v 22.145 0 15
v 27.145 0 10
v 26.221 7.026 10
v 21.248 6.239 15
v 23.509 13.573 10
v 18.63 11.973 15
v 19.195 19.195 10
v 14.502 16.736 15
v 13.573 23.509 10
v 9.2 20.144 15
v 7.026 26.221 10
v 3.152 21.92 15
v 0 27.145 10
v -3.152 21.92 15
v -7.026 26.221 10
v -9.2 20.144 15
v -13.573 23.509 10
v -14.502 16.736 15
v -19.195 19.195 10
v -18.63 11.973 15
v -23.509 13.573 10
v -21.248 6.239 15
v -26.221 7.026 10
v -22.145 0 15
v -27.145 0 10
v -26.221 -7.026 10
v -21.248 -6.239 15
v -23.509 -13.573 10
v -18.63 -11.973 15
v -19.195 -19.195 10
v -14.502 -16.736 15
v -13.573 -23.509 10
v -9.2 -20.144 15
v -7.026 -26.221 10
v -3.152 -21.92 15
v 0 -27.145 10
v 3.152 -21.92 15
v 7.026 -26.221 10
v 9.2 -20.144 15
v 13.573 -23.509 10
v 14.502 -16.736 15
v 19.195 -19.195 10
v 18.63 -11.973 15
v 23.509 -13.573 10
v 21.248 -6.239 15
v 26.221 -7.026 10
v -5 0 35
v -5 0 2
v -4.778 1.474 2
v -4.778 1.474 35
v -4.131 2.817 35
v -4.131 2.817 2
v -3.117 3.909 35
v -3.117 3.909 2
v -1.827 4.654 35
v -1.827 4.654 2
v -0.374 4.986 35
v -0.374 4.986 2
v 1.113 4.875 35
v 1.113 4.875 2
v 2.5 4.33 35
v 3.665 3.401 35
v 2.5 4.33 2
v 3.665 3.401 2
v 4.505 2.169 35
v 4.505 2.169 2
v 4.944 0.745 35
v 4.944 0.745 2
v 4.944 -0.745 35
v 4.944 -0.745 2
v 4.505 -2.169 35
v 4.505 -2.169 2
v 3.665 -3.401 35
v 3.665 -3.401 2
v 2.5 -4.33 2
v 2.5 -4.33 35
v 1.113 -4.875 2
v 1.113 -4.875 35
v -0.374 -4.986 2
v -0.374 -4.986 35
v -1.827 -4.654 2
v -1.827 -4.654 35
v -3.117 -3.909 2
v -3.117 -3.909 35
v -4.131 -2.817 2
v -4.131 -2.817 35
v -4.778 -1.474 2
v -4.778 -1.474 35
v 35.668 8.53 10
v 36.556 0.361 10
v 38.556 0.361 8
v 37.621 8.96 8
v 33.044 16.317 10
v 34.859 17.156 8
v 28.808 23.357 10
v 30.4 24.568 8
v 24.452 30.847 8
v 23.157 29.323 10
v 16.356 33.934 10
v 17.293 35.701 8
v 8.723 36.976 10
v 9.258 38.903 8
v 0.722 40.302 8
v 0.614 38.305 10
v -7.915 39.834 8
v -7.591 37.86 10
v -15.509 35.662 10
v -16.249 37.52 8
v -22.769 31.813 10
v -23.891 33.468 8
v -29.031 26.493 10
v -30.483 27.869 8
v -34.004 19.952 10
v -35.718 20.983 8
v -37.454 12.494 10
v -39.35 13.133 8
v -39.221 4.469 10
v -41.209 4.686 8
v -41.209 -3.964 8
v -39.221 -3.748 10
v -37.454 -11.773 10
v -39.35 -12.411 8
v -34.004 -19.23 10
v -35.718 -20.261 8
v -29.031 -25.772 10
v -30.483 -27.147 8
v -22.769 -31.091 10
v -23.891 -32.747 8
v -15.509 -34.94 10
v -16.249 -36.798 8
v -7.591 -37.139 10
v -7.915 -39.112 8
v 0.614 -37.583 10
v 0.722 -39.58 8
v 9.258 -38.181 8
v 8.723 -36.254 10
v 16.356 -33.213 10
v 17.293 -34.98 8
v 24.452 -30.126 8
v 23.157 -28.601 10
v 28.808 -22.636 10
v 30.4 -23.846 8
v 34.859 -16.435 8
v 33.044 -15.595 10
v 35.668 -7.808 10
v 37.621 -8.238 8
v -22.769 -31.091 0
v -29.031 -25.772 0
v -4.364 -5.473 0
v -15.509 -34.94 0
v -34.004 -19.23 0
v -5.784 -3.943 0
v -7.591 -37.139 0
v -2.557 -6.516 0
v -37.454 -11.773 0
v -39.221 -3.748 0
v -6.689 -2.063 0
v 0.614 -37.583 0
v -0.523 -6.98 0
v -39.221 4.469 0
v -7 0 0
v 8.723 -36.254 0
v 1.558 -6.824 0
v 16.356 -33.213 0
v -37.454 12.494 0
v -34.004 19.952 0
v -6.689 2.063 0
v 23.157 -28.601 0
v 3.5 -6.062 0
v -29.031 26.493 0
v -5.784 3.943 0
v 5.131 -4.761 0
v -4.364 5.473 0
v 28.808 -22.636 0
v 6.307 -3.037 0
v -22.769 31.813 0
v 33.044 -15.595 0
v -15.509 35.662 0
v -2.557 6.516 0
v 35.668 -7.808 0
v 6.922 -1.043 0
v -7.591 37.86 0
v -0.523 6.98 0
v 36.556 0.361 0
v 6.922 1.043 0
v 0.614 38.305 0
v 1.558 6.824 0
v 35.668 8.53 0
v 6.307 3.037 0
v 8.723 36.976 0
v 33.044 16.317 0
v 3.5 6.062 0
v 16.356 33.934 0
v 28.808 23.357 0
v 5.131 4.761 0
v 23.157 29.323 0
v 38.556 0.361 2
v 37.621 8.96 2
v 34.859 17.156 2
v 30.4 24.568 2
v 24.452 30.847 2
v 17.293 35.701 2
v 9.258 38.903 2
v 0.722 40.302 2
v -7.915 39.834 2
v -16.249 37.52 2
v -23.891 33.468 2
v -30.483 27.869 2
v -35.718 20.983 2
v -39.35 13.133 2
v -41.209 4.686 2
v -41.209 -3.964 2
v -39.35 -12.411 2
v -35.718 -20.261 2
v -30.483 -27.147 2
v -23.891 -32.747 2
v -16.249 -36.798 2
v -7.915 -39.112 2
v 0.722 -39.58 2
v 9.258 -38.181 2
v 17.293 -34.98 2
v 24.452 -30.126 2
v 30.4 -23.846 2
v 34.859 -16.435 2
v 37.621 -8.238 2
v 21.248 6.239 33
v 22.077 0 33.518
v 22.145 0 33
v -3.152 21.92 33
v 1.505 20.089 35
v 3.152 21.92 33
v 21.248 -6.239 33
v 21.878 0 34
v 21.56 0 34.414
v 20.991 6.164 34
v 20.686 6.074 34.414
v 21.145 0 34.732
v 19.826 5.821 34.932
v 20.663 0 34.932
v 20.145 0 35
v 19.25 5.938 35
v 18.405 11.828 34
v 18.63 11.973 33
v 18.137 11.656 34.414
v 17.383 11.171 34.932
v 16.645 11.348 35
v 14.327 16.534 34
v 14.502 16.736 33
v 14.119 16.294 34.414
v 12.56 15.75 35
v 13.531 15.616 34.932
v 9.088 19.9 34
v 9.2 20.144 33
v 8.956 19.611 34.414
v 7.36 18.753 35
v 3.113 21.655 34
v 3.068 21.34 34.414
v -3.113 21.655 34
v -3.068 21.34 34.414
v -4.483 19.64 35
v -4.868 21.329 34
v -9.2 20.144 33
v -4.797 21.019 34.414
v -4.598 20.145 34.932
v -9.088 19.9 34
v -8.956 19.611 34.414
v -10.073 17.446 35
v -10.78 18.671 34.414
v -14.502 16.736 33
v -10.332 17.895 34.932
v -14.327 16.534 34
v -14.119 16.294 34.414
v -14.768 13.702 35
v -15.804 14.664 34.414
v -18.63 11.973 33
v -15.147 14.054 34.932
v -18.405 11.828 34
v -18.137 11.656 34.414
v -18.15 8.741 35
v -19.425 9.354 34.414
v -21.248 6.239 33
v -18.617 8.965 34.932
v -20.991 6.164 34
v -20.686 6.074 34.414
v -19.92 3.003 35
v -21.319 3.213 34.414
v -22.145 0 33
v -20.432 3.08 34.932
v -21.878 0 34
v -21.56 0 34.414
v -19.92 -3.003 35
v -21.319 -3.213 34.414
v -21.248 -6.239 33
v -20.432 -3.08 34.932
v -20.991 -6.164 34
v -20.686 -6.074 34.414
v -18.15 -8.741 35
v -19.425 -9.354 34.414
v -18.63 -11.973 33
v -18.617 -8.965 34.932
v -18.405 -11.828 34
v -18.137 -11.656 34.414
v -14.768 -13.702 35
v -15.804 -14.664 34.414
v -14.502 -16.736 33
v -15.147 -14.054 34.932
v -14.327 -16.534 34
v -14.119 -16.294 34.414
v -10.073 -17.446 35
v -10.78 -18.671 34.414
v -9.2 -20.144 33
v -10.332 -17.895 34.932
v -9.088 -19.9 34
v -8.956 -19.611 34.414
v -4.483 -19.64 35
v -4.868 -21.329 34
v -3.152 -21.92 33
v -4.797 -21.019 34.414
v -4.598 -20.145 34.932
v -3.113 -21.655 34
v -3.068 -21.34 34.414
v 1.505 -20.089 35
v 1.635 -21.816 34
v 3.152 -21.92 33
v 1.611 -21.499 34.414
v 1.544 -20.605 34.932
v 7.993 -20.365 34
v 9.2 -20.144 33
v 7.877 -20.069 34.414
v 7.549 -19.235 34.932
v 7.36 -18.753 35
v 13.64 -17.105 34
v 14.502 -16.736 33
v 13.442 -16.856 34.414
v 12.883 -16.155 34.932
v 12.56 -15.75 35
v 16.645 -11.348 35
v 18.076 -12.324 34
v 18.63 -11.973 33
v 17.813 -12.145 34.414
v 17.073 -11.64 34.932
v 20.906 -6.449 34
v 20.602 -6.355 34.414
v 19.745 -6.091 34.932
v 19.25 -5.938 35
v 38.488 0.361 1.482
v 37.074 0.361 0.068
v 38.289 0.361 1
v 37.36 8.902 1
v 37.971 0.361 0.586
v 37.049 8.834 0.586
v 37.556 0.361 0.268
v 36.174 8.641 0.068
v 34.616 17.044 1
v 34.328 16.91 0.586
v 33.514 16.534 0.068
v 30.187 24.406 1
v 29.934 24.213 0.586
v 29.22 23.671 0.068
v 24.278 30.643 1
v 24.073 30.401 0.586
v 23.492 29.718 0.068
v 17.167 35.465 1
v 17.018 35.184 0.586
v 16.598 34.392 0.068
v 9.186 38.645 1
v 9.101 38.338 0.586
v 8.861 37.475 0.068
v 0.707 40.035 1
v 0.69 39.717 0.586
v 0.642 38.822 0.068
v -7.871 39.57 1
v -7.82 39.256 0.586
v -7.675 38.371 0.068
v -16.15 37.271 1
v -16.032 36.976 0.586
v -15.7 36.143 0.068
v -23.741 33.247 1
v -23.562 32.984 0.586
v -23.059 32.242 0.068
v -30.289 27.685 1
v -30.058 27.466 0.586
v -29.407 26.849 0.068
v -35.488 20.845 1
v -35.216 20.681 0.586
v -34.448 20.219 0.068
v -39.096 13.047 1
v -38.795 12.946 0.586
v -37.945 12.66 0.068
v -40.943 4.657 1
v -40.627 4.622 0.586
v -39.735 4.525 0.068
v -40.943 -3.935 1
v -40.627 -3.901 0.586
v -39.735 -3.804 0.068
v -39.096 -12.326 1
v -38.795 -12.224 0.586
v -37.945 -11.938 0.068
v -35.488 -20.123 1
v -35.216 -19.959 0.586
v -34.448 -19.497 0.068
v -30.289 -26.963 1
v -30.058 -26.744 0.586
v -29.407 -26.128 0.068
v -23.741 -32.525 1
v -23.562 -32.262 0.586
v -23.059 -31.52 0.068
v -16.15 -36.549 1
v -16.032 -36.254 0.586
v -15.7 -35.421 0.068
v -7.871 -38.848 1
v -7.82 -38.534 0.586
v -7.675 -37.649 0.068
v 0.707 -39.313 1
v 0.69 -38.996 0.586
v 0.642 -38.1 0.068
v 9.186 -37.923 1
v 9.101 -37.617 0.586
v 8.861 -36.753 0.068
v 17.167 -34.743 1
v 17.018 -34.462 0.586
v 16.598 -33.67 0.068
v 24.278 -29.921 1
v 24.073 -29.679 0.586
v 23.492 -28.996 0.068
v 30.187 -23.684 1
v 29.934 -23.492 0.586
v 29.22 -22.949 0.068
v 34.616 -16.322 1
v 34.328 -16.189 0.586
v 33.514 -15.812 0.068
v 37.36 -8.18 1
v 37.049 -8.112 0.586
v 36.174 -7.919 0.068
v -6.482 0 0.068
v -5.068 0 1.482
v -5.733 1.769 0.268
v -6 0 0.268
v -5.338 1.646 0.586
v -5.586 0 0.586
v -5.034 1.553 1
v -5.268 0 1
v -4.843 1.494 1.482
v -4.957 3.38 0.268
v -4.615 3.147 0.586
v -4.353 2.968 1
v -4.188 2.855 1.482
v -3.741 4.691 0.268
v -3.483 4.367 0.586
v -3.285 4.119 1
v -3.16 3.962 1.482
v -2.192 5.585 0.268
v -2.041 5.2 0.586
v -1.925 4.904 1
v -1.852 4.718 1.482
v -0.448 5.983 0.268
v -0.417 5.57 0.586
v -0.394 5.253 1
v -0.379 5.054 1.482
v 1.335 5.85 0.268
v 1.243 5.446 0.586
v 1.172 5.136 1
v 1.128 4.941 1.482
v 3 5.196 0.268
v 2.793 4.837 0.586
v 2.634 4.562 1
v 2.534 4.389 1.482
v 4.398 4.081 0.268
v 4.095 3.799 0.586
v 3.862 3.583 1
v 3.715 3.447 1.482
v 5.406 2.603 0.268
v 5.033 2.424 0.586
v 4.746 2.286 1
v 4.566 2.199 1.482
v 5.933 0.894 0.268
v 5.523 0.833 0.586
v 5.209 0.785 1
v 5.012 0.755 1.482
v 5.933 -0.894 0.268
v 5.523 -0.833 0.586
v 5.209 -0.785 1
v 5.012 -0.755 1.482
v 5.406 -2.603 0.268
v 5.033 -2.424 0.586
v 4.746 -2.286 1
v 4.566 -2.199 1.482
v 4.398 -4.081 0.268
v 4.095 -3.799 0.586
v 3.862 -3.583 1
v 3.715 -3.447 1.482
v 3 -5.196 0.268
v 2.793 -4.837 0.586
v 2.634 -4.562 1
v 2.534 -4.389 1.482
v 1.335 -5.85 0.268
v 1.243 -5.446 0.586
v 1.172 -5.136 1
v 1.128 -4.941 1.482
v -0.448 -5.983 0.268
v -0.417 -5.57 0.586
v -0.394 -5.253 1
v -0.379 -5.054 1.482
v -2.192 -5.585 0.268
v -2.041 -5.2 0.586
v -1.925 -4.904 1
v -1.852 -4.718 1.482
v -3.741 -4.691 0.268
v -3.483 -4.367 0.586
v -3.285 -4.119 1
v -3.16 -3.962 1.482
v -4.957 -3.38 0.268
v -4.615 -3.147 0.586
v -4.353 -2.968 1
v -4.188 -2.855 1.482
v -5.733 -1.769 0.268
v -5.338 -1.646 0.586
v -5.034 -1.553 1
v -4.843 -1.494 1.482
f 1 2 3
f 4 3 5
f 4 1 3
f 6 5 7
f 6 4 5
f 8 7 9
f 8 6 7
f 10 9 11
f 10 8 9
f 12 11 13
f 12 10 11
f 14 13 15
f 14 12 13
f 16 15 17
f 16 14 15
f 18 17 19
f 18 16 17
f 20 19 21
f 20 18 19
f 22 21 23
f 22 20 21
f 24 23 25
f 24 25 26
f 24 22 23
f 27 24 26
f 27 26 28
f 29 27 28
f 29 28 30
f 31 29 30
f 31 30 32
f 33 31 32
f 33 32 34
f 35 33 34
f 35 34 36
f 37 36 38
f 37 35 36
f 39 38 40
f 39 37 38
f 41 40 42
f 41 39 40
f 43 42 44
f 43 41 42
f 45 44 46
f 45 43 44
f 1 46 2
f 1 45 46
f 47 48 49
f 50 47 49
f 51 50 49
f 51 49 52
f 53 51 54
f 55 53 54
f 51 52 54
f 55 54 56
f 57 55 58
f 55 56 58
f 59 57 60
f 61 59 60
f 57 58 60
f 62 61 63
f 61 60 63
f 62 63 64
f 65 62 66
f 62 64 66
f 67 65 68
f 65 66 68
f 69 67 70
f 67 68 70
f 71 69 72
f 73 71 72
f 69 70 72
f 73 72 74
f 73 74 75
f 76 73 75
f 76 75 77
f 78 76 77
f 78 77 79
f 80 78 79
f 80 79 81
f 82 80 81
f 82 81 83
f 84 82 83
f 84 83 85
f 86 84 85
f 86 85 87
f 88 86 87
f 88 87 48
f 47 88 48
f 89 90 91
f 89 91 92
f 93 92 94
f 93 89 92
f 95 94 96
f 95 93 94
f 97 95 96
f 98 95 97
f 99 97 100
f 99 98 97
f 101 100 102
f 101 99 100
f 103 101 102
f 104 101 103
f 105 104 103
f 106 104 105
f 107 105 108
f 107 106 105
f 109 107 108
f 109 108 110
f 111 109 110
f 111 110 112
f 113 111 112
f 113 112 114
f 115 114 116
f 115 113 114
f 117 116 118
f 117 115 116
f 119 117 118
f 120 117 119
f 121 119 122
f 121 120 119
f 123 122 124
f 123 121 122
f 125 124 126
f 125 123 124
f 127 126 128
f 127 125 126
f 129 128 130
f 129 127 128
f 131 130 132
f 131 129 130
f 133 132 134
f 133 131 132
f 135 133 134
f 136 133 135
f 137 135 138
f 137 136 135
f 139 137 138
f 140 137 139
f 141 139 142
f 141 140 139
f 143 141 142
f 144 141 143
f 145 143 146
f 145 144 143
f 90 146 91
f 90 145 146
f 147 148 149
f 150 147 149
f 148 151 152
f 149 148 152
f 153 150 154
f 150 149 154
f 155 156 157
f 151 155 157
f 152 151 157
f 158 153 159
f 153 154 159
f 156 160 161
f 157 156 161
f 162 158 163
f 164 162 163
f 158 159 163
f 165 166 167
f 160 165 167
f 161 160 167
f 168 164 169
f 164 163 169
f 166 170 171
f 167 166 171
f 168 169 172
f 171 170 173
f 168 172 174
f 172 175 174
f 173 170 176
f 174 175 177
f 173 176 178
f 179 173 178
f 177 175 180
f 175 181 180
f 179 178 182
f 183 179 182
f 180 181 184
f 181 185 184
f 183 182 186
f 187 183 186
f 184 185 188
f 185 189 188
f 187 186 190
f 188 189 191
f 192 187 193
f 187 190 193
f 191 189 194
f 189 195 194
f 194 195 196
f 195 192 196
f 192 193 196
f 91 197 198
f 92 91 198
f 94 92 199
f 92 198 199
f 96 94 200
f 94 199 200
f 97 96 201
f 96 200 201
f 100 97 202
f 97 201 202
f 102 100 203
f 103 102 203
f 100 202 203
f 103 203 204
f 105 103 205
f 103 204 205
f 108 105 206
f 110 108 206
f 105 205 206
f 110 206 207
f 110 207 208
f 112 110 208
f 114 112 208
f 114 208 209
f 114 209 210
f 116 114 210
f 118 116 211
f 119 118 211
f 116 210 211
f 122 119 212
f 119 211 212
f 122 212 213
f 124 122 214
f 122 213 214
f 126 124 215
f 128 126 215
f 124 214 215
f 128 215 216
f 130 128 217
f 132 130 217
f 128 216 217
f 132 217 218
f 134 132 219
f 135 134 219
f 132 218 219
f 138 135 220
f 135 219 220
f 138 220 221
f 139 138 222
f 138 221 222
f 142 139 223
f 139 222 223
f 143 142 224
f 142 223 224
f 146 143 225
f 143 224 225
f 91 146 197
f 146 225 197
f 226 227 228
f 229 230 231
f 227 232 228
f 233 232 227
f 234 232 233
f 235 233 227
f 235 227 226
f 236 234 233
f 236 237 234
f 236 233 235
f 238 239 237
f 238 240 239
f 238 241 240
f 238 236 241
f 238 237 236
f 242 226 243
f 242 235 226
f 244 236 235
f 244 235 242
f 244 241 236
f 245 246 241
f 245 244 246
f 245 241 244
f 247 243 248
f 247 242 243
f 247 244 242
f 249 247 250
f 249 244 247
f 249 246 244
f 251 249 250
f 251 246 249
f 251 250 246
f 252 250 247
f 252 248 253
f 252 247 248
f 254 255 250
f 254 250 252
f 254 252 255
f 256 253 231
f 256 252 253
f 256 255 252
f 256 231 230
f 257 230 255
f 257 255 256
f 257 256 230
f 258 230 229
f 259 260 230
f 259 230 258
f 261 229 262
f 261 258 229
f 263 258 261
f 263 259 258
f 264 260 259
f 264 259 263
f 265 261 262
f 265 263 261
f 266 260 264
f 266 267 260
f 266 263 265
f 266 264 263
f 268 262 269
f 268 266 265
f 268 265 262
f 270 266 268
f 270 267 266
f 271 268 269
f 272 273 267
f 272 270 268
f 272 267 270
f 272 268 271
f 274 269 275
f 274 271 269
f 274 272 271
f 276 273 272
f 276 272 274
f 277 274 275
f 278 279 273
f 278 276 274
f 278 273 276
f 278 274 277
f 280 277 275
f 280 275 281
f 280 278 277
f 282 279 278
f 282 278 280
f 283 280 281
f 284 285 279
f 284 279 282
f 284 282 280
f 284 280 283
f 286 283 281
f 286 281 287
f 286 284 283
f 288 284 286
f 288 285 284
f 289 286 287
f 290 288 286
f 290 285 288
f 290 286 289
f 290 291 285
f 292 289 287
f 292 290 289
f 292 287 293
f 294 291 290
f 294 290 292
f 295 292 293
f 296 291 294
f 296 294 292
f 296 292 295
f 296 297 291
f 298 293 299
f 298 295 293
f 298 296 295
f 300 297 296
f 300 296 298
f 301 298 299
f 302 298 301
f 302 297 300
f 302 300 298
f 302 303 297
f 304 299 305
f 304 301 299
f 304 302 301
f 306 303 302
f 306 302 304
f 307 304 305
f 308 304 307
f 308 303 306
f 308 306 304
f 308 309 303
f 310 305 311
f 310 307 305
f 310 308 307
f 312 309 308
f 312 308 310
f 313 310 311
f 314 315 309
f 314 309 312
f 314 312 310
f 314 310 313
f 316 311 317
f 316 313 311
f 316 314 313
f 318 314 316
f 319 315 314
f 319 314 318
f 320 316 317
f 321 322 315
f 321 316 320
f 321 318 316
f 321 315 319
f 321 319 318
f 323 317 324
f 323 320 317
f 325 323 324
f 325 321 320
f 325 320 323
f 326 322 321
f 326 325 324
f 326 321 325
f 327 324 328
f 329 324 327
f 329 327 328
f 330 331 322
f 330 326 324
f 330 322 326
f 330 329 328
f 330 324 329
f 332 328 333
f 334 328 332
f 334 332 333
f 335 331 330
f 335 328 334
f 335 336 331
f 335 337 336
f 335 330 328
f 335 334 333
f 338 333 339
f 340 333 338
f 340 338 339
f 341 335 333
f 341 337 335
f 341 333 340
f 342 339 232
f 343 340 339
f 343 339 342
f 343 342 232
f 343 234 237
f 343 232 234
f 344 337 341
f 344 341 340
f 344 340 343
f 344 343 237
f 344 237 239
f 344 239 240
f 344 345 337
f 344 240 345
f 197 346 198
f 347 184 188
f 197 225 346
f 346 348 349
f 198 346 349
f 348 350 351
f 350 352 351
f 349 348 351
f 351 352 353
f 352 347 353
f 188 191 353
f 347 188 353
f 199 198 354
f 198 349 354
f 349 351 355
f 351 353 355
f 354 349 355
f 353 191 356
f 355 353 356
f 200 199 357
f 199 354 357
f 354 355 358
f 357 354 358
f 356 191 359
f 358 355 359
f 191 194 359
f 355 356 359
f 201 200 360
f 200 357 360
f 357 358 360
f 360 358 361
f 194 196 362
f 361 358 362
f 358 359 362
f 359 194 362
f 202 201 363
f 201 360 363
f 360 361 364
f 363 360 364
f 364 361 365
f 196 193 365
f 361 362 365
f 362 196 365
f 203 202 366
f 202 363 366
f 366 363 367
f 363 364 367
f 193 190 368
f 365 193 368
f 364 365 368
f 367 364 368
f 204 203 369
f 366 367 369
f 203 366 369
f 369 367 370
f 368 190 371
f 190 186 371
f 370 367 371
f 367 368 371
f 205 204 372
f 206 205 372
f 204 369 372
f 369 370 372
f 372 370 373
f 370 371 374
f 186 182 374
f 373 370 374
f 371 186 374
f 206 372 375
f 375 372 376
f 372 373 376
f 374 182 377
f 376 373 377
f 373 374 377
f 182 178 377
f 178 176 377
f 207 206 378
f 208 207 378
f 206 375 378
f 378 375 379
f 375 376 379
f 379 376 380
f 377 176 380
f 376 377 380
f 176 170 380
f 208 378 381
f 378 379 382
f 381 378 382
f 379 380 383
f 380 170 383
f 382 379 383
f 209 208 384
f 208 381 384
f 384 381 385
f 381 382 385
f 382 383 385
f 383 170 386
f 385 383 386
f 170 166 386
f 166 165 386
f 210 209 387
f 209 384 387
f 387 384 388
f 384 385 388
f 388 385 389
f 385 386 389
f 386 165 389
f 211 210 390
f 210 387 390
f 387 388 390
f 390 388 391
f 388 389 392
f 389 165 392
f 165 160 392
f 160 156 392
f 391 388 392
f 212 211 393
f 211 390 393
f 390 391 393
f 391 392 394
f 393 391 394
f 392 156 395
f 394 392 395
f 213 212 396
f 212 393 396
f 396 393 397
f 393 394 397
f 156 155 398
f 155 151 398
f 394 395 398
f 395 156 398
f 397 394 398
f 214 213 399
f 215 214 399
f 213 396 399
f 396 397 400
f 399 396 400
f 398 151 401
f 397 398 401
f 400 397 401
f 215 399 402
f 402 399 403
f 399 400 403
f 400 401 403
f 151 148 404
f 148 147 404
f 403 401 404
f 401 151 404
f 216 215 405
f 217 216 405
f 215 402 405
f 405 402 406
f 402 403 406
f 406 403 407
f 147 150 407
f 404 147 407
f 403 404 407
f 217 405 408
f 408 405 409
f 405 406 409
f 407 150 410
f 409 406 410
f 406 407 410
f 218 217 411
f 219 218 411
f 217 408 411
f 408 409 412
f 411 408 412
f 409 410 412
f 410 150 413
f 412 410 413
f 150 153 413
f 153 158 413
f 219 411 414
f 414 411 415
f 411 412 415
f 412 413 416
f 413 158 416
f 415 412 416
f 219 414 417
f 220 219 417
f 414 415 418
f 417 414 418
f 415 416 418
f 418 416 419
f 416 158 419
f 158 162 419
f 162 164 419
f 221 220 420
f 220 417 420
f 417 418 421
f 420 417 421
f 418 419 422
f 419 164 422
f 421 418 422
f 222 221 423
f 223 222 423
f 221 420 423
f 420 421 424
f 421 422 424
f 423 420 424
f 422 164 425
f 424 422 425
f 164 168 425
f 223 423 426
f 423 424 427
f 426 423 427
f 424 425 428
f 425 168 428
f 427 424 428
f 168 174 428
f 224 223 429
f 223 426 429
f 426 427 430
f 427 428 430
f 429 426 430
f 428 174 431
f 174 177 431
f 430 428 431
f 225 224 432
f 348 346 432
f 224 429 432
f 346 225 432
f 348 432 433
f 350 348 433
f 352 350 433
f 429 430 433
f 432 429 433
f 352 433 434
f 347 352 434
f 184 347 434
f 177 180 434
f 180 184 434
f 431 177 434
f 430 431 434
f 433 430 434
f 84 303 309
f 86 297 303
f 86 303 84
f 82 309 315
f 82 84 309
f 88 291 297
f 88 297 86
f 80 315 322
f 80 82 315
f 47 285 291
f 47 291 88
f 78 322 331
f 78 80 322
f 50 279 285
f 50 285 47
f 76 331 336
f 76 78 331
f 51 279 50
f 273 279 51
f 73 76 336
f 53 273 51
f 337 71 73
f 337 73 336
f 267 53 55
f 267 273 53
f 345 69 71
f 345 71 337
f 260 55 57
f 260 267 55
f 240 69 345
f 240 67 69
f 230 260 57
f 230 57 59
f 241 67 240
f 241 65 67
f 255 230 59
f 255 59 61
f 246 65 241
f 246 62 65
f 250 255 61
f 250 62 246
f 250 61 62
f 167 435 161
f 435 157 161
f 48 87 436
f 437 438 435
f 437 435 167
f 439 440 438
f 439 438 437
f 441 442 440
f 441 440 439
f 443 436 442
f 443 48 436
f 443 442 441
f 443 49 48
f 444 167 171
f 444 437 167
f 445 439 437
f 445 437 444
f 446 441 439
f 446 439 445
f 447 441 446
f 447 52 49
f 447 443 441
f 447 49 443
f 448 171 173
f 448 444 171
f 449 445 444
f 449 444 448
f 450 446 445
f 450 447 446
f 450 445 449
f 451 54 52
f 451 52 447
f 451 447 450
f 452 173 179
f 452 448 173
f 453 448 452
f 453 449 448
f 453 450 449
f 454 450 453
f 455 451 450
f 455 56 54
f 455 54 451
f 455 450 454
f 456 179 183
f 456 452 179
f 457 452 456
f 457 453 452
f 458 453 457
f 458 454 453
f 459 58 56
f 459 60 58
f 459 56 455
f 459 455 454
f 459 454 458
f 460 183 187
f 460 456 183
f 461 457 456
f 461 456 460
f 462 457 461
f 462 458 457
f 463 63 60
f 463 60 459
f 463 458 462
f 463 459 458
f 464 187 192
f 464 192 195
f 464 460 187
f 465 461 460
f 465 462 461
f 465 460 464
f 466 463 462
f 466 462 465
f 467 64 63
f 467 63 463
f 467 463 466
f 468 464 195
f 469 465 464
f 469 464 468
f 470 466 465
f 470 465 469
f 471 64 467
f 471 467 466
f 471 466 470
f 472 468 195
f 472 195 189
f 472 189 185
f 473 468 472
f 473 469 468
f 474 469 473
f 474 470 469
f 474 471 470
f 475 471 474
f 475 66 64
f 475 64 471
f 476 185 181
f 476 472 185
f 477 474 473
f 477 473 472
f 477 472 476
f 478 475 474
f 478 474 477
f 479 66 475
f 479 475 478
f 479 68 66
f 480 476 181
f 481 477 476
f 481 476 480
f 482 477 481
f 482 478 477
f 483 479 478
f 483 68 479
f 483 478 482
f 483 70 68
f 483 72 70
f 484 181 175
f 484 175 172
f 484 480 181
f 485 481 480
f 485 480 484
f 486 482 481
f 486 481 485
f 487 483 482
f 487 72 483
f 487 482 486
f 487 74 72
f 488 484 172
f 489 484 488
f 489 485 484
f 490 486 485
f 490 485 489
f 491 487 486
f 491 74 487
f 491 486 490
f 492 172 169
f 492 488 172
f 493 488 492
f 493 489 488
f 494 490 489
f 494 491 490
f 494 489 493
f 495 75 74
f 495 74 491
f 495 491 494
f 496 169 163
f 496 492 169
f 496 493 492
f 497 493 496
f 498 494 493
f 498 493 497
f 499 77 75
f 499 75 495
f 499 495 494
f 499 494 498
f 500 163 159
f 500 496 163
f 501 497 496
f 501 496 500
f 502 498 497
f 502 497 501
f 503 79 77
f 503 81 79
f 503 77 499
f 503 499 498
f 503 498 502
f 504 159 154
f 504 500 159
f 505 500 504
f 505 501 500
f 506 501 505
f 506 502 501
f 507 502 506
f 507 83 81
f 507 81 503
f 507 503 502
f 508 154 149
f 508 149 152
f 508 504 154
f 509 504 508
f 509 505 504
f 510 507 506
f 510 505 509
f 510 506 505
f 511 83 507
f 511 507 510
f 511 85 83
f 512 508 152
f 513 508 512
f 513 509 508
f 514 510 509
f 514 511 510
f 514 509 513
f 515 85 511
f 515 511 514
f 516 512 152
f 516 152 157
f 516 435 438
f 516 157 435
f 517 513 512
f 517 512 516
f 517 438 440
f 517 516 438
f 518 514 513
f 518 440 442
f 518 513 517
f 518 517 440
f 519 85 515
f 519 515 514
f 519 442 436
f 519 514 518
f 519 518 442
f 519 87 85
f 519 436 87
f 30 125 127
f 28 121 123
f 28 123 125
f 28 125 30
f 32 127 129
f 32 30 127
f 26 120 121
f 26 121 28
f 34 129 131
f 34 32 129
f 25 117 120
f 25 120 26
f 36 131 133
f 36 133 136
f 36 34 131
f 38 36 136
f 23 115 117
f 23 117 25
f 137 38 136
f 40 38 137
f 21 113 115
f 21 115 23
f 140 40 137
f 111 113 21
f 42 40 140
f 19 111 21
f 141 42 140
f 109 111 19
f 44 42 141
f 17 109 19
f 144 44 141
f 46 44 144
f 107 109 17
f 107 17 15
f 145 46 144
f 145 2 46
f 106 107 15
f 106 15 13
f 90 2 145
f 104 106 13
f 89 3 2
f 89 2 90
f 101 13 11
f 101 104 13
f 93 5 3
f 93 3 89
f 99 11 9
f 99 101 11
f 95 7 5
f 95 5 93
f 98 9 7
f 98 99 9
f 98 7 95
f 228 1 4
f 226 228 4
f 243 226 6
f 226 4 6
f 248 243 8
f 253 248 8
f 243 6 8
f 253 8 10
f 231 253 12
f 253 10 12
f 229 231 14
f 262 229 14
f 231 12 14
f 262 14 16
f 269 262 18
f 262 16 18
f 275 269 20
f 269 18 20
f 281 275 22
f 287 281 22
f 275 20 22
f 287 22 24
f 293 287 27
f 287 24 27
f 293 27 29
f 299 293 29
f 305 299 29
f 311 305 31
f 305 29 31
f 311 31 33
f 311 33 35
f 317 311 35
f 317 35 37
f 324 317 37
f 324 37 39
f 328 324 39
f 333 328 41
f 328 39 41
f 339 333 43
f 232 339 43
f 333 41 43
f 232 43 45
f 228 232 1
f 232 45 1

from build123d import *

# Parameters (mm, degrees)
F0_R     = 40
F1_DEPTH = 10
F2_SIZE  = 2
F3_R     = 22.145473903
F4_DEPTH = 25
F6_D     = 10
F7_R     = 2
F8_SIZE  = 5


with BuildPart() as f1:
    # F0 (on Top) → F1 (new body)
    with BuildSketch(Plane.XY):
        with Locations((-1.4435499907, 0.3608763218)):
            Circle(F0_R)
    extrude(amount=F1_DEPTH)

    # F2
    f2_edges = [f1.edges().sort_by_distance(p)[0] for p in [
        (-41.44355, 0.360876, 10),
    ]]
    chamfer(f2_edges, length=F2_SIZE)

    # F3 (on face) → F4 (join)
    with BuildSketch(Plane.XY.offset(10)):
        Circle(F3_R)
    extrude(amount=F4_DEPTH)

    # F6 (through all)
    with Locations(Plane.XY.offset(35)):
        with Locations((0, 0)):
            Hole(F6_D / 2)

    # F7
    f7_edges = [f1.edges().sort_by_distance(p)[0] for p in [
        (-41.44355, 0.360876, 0),
        (-22.145474, 0, 35),
        (-5, 0, 0),
    ]]
    fillet(f7_edges, radius=F7_R)

    # F8
    f8_edges = [f1.edges().sort_by_distance(p)[0] for p in [
        (22.145474, 0, 21.5),
        (-22.145474, 0, 33),
        (-22.145474, 0, 10),
    ]]
    chamfer(f8_edges, length=F8_SIZE)


solid = f1.part
